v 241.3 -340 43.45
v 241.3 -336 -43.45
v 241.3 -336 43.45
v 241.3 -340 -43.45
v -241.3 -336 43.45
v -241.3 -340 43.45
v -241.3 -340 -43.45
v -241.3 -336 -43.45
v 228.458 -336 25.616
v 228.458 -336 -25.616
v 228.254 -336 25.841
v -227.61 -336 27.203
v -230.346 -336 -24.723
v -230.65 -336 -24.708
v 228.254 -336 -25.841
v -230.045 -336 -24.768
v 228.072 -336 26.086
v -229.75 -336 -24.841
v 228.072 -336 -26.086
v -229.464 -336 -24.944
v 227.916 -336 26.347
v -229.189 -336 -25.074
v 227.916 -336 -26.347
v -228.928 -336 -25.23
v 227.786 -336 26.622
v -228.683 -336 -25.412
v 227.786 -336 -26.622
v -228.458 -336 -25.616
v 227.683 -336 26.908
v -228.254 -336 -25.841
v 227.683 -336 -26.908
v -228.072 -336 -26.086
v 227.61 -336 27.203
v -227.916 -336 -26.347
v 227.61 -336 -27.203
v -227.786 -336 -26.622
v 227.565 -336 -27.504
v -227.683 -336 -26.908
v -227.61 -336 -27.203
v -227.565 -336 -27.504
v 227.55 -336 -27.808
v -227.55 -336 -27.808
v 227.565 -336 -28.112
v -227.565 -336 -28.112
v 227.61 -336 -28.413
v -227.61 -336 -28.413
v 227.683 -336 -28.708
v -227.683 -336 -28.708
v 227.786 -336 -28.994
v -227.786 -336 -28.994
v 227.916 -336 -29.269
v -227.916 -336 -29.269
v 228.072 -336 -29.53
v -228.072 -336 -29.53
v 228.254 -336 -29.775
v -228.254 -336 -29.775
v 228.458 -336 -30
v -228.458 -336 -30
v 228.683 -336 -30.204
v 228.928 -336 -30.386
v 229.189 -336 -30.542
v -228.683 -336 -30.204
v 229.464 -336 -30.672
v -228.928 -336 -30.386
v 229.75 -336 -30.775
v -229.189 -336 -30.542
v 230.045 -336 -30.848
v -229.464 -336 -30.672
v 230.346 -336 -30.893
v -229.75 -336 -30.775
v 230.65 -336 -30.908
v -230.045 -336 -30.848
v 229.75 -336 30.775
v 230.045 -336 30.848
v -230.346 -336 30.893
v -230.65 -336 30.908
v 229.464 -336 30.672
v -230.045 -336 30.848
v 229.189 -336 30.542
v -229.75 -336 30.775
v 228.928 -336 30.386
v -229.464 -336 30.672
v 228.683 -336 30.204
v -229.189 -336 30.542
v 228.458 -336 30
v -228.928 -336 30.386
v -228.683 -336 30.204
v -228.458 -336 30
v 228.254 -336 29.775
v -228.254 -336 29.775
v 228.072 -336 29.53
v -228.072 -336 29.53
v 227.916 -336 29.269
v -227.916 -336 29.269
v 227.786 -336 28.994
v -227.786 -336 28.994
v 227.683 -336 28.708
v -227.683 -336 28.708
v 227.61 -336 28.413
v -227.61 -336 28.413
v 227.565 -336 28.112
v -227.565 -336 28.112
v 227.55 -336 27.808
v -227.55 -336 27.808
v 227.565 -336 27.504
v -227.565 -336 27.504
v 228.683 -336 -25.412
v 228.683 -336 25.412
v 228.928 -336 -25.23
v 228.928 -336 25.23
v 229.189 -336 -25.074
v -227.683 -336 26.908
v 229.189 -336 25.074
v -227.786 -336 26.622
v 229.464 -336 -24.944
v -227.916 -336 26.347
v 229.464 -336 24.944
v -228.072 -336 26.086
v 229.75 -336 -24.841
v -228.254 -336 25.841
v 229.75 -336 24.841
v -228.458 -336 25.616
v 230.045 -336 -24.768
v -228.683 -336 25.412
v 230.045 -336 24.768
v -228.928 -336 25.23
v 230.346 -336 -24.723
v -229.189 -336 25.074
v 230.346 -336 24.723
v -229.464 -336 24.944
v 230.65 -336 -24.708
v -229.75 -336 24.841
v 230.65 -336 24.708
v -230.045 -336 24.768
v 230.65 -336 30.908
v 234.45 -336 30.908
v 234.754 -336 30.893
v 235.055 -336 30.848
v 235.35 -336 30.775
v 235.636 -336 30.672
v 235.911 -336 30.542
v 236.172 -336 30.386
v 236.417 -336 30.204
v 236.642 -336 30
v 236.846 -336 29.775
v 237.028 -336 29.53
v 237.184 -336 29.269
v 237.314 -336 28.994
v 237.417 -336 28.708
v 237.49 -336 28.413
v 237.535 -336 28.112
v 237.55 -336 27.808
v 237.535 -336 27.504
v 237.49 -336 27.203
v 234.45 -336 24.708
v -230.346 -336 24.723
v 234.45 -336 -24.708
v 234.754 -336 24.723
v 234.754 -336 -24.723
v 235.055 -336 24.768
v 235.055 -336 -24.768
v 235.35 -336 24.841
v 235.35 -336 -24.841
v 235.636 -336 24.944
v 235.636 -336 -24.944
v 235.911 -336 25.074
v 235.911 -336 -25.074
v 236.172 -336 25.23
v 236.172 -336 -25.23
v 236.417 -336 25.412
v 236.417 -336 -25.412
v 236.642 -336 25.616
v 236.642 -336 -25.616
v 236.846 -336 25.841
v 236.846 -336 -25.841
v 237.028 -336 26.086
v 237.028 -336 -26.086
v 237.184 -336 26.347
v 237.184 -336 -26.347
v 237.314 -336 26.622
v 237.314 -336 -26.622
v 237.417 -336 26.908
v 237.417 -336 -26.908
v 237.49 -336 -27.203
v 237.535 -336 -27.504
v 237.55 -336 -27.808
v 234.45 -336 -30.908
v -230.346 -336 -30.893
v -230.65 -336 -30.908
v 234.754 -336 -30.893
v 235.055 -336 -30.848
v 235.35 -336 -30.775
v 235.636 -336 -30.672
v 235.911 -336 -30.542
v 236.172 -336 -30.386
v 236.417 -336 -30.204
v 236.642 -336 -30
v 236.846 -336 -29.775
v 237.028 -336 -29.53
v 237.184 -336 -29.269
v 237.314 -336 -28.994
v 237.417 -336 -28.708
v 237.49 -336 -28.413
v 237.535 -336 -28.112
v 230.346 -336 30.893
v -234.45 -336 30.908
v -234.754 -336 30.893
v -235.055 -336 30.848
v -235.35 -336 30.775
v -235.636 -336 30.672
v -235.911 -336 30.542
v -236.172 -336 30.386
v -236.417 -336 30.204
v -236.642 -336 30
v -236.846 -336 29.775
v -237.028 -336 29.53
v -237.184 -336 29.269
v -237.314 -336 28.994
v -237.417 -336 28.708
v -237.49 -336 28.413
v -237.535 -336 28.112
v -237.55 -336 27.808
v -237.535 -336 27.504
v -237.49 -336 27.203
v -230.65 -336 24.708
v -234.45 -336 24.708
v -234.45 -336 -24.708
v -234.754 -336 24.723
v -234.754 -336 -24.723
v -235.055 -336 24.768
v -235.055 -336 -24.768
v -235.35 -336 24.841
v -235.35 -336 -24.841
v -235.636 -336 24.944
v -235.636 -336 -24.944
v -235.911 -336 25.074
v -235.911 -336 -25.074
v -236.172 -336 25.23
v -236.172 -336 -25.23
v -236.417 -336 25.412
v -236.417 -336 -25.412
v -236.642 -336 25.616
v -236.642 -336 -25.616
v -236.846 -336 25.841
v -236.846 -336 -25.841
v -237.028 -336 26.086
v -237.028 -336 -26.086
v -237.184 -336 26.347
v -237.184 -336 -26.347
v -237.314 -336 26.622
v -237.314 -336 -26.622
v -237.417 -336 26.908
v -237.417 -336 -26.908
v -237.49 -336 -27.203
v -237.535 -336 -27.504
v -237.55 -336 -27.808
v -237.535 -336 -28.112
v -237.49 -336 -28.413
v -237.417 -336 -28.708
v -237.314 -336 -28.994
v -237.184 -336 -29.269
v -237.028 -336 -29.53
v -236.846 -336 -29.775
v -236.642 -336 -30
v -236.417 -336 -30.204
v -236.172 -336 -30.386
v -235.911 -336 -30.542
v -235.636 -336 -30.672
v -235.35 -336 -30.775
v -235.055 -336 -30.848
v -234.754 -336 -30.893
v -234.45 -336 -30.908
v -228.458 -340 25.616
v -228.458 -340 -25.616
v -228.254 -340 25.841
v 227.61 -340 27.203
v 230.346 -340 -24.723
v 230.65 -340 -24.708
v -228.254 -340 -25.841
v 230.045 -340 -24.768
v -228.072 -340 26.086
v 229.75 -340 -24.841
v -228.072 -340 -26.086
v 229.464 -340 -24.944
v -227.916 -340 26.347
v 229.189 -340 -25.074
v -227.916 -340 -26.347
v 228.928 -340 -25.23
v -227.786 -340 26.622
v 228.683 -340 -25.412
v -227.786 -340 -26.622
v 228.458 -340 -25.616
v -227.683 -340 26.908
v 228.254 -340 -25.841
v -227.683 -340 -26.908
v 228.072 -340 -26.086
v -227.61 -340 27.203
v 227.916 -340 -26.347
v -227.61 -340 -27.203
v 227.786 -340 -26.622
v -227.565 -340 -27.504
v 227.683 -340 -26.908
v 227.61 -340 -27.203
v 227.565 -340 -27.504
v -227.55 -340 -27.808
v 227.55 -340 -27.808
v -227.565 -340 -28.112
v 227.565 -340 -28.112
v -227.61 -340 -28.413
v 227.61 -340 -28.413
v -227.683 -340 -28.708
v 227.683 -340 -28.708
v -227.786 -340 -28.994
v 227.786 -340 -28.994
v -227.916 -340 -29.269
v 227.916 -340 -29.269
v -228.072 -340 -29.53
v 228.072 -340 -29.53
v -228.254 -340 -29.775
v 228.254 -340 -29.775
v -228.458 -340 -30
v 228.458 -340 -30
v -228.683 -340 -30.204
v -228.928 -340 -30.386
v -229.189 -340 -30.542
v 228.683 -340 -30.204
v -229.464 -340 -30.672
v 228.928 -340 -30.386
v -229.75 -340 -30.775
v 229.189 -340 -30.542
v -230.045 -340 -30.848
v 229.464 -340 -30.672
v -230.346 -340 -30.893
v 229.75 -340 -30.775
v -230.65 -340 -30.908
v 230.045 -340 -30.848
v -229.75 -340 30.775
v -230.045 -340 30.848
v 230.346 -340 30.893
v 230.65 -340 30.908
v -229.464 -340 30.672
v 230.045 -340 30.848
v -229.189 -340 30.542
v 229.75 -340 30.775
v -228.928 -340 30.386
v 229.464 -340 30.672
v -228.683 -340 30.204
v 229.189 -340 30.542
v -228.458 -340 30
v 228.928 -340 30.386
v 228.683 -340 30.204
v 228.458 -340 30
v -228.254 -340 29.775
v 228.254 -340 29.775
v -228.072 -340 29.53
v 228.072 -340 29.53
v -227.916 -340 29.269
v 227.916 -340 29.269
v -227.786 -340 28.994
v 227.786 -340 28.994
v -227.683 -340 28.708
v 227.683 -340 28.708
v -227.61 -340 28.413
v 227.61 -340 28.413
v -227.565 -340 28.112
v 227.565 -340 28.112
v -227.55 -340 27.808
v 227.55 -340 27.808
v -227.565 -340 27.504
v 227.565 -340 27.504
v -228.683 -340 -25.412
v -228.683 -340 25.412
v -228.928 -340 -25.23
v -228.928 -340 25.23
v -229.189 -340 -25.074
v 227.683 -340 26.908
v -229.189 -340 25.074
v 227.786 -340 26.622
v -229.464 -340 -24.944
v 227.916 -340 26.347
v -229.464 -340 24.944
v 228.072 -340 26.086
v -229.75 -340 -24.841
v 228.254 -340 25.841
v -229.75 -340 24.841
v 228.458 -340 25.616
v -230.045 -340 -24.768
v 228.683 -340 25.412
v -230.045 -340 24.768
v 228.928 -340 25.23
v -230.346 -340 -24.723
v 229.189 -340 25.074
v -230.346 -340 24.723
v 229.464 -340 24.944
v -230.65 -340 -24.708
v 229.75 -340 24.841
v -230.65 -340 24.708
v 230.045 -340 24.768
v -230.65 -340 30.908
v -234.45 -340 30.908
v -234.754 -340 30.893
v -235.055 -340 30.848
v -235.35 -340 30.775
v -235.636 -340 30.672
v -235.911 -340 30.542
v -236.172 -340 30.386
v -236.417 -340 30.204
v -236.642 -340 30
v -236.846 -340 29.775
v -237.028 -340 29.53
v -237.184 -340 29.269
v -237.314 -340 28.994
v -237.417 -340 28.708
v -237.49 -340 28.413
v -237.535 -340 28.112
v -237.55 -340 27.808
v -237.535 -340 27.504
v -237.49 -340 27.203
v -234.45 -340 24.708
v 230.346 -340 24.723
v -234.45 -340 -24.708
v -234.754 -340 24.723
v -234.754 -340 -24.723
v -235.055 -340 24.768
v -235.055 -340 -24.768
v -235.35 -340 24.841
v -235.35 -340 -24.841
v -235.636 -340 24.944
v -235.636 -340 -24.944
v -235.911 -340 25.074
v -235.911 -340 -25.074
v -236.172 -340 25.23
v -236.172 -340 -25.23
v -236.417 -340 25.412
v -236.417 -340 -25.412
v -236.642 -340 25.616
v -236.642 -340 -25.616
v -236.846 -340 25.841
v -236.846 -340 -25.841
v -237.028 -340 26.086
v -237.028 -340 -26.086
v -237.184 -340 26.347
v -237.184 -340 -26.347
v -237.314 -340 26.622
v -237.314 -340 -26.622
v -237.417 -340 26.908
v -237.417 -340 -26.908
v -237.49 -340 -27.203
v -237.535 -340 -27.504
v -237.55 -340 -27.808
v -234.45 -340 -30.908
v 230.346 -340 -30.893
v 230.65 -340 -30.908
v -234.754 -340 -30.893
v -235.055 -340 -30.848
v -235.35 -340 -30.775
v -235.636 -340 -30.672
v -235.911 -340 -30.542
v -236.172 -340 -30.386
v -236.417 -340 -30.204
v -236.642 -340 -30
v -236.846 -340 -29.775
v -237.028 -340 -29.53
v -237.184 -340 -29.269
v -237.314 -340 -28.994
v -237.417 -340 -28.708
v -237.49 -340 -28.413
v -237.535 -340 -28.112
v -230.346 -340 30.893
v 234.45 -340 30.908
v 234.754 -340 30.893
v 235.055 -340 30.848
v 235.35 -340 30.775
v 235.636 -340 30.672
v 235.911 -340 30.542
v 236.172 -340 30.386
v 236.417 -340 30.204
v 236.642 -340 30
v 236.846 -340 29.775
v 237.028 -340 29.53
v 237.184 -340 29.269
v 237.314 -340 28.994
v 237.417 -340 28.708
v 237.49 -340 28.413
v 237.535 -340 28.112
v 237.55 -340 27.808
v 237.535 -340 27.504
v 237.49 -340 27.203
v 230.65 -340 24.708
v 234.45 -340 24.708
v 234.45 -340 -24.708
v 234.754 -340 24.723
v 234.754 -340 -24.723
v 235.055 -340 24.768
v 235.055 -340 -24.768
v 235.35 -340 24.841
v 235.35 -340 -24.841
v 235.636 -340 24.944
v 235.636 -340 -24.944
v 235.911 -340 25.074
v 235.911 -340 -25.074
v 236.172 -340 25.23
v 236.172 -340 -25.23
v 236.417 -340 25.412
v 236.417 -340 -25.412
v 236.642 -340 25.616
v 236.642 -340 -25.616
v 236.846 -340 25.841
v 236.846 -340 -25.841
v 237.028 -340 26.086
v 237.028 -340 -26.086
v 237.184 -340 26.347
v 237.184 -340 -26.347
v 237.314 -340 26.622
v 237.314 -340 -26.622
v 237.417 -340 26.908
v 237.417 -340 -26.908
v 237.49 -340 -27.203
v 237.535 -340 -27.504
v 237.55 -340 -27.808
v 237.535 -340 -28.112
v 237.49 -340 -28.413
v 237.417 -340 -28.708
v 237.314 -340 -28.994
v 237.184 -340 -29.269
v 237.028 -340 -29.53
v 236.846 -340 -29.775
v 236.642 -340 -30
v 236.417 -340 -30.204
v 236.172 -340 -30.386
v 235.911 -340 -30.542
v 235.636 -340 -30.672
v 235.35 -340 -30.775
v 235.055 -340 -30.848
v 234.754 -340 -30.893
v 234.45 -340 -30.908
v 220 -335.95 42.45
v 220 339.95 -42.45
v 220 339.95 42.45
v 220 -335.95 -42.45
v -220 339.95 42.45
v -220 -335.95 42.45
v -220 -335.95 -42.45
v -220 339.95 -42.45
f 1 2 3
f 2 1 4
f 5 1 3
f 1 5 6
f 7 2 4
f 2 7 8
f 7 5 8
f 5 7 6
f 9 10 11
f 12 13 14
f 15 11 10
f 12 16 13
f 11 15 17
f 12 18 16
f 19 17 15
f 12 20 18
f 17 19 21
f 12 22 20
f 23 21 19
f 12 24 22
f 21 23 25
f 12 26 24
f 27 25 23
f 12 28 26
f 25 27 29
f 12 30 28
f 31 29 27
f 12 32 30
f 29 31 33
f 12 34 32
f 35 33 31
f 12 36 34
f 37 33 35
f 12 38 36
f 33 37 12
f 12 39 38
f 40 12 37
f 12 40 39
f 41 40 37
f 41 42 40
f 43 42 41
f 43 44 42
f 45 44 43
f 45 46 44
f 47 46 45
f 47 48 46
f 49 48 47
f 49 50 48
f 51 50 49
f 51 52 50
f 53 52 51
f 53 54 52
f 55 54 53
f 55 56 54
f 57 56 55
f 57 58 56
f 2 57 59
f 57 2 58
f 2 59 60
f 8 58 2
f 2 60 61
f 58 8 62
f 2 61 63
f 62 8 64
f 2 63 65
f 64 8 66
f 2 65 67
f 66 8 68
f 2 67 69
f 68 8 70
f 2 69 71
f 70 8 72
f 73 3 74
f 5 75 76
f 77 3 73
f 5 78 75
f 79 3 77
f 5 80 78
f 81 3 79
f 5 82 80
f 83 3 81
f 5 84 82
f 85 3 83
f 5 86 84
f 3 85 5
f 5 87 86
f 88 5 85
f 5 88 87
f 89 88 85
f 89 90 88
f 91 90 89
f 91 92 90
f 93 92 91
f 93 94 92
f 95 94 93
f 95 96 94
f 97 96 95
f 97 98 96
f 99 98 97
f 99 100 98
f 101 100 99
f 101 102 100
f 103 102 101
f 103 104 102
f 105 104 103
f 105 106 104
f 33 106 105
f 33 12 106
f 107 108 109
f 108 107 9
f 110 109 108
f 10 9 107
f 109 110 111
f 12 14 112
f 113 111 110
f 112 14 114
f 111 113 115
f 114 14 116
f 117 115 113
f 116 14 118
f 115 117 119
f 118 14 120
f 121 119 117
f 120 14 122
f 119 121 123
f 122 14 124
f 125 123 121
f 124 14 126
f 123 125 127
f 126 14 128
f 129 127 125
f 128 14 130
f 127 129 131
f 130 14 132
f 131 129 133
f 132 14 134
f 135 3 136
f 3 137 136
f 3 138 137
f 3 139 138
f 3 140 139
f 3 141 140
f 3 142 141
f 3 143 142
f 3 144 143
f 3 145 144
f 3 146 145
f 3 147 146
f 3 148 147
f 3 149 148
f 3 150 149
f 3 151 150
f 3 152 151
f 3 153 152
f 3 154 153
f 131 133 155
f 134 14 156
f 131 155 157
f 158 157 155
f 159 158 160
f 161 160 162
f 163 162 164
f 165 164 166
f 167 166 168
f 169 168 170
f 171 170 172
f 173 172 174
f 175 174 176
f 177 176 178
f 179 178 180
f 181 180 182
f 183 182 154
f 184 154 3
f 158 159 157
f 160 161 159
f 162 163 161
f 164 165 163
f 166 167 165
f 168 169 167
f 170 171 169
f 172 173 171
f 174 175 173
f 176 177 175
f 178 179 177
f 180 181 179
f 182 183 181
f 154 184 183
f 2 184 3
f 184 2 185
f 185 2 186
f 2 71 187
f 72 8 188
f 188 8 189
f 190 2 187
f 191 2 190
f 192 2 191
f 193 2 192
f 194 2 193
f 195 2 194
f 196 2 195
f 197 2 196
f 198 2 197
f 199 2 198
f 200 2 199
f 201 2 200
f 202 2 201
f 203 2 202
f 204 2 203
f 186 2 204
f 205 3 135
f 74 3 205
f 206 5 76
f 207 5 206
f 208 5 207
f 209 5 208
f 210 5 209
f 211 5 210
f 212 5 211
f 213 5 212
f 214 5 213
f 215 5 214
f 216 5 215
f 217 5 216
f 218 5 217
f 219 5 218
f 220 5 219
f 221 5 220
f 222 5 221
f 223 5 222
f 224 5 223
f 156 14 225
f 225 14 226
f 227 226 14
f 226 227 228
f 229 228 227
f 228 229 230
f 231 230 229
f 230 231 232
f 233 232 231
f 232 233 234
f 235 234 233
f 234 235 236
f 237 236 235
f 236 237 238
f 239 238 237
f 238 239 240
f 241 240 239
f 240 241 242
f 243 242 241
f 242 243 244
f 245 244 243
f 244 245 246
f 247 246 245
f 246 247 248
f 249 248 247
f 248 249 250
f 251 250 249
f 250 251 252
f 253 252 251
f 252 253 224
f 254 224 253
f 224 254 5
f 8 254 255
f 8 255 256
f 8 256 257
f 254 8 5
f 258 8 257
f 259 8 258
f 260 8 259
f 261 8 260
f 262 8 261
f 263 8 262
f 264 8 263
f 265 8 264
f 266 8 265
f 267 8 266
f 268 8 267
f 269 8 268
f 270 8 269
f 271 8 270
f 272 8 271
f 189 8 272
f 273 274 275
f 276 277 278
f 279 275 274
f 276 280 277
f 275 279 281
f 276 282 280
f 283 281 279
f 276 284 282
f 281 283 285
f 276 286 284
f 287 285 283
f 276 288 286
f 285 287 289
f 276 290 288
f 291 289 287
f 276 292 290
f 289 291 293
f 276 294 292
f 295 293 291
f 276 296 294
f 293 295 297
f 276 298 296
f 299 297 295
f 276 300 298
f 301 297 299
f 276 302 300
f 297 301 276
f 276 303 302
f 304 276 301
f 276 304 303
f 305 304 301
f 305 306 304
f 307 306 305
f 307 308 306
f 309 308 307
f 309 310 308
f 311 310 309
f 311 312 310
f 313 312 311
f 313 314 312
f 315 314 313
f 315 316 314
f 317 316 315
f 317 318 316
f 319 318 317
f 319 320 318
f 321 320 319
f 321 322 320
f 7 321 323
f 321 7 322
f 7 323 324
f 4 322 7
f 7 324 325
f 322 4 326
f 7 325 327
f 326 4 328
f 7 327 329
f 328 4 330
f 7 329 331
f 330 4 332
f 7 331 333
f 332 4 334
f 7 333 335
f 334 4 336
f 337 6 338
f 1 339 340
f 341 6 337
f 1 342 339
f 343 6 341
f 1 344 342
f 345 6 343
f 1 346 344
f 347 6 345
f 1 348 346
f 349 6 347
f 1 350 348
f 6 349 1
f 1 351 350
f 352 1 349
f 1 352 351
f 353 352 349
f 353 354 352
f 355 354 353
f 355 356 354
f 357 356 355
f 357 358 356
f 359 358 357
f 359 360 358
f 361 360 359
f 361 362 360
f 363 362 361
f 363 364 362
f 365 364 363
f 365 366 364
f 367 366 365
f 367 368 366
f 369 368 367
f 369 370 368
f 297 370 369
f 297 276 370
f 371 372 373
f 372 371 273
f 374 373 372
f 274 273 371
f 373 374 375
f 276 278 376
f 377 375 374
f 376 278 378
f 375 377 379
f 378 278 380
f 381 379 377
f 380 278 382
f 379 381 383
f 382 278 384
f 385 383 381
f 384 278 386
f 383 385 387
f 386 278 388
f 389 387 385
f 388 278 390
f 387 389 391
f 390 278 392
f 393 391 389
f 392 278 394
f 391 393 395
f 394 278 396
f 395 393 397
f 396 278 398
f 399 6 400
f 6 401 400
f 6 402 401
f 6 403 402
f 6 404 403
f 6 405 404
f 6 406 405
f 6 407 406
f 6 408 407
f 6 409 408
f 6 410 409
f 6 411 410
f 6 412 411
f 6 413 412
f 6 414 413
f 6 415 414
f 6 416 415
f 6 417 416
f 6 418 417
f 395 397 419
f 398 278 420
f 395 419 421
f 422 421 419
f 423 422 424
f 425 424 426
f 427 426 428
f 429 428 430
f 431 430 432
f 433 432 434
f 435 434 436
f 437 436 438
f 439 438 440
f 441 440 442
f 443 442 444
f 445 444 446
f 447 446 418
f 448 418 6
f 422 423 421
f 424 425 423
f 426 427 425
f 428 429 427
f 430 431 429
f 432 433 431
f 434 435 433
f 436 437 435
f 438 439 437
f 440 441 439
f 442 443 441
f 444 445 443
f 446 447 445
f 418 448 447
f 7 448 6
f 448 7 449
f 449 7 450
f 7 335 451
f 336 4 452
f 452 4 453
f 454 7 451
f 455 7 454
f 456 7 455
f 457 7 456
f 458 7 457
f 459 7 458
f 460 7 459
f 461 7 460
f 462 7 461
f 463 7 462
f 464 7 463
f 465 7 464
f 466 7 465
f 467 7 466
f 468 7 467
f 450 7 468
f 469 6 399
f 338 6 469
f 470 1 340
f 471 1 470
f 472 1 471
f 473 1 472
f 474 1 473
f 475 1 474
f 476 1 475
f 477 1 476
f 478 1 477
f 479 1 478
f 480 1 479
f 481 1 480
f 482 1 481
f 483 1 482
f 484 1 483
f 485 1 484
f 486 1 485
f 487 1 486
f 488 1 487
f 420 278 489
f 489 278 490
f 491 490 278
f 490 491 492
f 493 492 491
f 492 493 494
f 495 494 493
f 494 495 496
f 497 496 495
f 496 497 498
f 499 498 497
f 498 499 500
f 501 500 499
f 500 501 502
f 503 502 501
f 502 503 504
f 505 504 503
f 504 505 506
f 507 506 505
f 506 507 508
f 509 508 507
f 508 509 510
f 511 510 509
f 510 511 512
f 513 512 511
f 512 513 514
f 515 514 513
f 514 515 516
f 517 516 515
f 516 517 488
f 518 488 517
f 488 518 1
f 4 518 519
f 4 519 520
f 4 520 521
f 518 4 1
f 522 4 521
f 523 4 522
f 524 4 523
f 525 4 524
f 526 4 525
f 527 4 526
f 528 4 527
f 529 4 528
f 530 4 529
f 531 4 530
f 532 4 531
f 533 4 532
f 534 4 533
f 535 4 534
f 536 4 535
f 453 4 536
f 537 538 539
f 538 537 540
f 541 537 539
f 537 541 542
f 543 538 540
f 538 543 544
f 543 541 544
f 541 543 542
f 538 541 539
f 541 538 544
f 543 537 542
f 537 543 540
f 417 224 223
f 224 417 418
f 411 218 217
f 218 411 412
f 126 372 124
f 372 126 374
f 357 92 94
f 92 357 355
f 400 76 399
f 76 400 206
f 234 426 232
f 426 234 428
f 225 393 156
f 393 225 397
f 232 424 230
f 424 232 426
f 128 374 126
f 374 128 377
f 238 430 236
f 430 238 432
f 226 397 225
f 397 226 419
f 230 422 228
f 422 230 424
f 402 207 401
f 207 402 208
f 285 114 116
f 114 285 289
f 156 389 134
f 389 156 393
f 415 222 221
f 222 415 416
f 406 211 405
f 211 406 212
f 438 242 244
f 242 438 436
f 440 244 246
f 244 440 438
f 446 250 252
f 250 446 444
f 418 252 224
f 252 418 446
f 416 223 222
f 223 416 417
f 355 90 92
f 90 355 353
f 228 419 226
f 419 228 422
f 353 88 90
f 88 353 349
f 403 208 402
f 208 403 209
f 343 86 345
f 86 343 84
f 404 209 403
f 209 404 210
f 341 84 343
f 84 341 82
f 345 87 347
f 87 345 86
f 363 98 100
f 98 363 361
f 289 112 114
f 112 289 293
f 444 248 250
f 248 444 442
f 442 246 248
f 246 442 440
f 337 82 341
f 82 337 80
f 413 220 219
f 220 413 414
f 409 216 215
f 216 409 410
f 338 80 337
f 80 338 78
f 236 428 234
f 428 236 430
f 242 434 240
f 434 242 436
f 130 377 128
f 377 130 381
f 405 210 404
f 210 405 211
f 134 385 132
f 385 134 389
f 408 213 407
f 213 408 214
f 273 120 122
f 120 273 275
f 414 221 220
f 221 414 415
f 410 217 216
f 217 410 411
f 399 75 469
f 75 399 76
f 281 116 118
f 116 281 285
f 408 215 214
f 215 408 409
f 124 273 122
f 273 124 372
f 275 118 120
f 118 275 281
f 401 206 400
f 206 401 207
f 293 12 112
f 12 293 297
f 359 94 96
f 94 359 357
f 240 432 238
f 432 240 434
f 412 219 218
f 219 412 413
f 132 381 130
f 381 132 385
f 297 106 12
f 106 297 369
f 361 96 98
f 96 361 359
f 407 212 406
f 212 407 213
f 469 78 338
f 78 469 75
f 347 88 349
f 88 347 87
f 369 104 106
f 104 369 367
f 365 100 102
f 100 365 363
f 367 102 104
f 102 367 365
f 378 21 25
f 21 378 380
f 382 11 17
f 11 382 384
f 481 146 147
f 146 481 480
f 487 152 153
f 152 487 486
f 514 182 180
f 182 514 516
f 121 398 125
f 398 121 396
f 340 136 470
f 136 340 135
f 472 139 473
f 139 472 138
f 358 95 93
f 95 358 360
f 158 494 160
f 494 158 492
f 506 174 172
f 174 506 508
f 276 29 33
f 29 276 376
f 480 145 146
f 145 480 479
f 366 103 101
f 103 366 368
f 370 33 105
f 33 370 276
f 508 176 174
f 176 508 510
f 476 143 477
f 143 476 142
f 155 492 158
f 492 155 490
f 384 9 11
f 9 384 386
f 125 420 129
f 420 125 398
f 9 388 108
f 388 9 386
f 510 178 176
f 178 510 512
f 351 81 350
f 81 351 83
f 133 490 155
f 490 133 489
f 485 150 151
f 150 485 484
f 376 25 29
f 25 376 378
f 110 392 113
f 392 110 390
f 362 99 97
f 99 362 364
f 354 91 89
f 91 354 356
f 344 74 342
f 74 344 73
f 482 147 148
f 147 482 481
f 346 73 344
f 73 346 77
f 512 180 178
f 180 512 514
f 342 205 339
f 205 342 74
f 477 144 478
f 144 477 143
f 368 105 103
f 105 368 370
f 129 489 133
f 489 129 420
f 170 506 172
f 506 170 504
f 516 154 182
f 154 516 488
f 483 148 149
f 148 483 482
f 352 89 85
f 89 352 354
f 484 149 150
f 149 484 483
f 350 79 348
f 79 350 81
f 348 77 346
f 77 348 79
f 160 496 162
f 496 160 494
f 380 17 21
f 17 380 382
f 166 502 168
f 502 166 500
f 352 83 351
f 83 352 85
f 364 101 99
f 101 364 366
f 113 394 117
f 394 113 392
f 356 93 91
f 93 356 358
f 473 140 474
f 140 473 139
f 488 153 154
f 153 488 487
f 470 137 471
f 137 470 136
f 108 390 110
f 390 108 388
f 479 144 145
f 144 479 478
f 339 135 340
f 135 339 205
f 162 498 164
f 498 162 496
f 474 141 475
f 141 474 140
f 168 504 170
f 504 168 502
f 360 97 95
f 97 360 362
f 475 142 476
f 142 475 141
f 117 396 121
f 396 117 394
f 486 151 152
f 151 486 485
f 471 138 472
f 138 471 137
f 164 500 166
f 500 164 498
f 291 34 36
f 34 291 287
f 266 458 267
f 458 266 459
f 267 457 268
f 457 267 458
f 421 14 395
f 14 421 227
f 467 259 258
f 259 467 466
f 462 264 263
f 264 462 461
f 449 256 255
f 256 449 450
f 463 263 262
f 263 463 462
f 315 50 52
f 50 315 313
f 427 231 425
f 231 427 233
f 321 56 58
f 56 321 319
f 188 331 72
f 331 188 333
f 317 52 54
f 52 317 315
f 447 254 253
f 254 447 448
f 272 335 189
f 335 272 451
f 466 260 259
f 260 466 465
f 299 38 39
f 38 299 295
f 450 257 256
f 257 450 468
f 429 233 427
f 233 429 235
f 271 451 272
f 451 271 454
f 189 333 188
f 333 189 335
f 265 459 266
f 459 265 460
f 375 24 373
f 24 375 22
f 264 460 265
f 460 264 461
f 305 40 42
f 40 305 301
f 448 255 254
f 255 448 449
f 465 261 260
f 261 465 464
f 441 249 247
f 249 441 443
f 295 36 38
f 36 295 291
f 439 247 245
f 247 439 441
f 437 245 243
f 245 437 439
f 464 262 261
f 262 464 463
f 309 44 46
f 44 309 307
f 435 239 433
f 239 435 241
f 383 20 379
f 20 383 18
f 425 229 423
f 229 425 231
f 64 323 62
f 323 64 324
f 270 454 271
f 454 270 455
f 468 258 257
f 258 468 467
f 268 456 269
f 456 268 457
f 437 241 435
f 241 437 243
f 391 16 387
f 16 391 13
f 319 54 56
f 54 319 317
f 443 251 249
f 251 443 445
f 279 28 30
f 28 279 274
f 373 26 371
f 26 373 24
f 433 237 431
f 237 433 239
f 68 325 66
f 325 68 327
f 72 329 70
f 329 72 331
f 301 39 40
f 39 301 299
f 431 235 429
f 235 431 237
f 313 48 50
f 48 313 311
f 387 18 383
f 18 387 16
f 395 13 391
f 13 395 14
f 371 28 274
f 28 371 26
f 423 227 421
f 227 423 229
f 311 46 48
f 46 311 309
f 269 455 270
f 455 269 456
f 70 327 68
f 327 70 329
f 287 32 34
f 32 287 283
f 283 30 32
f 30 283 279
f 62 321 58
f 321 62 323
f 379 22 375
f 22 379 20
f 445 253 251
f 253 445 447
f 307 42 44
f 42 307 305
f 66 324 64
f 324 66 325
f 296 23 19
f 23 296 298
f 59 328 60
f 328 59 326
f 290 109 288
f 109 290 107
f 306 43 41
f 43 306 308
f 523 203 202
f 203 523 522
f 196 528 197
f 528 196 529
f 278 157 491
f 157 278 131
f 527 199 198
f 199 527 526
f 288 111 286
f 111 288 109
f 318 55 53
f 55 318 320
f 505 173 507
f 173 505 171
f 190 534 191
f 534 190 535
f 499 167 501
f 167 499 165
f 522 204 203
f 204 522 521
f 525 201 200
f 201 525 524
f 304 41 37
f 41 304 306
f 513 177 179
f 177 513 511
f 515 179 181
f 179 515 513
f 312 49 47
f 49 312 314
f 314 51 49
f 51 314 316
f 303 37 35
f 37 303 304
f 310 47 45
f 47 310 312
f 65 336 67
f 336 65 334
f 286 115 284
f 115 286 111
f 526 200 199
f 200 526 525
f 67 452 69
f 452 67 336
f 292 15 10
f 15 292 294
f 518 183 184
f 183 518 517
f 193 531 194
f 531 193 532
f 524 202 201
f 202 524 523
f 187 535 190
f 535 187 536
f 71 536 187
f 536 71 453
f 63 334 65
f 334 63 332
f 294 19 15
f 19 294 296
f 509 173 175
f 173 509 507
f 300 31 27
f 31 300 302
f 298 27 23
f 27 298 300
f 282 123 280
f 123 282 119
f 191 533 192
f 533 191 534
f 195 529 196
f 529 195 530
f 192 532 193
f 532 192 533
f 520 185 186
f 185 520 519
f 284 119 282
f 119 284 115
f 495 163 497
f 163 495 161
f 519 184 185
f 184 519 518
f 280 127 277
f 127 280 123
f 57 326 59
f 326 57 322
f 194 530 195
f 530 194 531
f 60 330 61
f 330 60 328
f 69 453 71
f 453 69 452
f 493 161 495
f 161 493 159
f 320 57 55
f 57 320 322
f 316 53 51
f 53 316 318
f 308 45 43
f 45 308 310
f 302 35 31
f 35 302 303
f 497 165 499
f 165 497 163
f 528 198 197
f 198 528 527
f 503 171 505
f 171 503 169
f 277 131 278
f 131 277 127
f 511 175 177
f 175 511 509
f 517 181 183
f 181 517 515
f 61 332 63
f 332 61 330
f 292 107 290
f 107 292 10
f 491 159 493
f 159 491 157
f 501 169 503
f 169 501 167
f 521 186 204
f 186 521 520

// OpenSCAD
// ============================================================================
// Atom Lithography Machine — Parametric OpenSCAD Module (S7.1-01)
// ============================================================================
// part_id           : S7.1-01
// parent_bom_id     : S7.1
// subsystem         : S7
// part_name         : Ana kontrol ve GPU GRAPE sentez is istasyonlari (2x Lambda Vector 2xRTX4500Ada)
// material          : Steel
// temp_stage        : 300 K (kabin)
// vacuum_grade      : Atmosfer
// tolerance         : 24/7 calisma
// computed_mass_kg  : 38.00000
// envelope_mm       : 482.600 x 718.400 x 175.800
// design_maturity   : M0_M1_DETAILED_CAD_DESIGN_ONLY
// no_lab_measurement: true
// iec61508_certified: false
// semi_s2_certified : false
// Units: millimeters (mm)
// ============================================================================

$fn = 64;

// Nominal bounding envelope parameters (mm)
bbox_x = 482.6000;
bbox_y = 718.4000;
bbox_z = 175.8000;

// Part-specific parametric dimensions
qty_nodes = 2;
u_per_node = 2;
u_start = 4;
depth_mm = 680.0;

// Interface / port parameters (mm)

module part_S7_1_01() {
  difference() {
    union() {
      // 19-inch EIA-310 front faceplate
      translate([0.000, -338.000, 0.000]) cube([482.600, 4.000, 86.900], center=true);
      // Main rack chassis enclosure
      translate([0.000, 2.000, 0.000]) cube([440.000, 675.900, 84.900], center=true);
    }
    // EIA-310 rack ear mounting slot (top-left)
    translate([-232.550, -338.000, 27.808]) rotate([90.000, 0.000, 0.000]) {
      hull() {
        translate([-1.900, 0, 0]) cylinder(d=6.200, h=8.000, center=true);
        translate([1.900, 0, 0]) cylinder(d=6.200, h=8.000, center=true);
      }
    }
    // EIA-310 rack ear mounting slot (top-right)
    translate([232.550, -338.000, 27.808]) rotate([90.000, 0.000, 0.000]) {
      hull() {
        translate([-1.900, 0, 0]) cylinder(d=6.200, h=8.000, center=true);
        translate([1.900, 0, 0]) cylinder(d=6.200, h=8.000, center=true);
      }
    }
    // EIA-310 rack ear mounting slot (bottom-left)
    translate([-232.550, -338.000, -27.808]) rotate([90.000, 0.000, 0.000]) {
      hull() {
        translate([-1.900, 0, 0]) cylinder(d=6.200, h=8.000, center=true);
        translate([1.900, 0, 0]) cylinder(d=6.200, h=8.000, center=true);
      }
    }
    // EIA-310 rack ear mounting slot (bottom-right)
    translate([232.550, -338.000, -27.808]) rotate([90.000, 0.000, 0.000]) {
      hull() {
        translate([-1.900, 0, 0]) cylinder(d=6.200, h=8.000, center=true);
        translate([1.900, 0, 0]) cylinder(d=6.200, h=8.000, center=true);
      }
    }
  }
}

// World assembly mounting transform (global machine frame, mm / deg):
// translate([1480.000, -98.000, 312.250]) rotate([0.000, 0.000, 0.000]) part_S7_1_01();

part_S7_1_01();
